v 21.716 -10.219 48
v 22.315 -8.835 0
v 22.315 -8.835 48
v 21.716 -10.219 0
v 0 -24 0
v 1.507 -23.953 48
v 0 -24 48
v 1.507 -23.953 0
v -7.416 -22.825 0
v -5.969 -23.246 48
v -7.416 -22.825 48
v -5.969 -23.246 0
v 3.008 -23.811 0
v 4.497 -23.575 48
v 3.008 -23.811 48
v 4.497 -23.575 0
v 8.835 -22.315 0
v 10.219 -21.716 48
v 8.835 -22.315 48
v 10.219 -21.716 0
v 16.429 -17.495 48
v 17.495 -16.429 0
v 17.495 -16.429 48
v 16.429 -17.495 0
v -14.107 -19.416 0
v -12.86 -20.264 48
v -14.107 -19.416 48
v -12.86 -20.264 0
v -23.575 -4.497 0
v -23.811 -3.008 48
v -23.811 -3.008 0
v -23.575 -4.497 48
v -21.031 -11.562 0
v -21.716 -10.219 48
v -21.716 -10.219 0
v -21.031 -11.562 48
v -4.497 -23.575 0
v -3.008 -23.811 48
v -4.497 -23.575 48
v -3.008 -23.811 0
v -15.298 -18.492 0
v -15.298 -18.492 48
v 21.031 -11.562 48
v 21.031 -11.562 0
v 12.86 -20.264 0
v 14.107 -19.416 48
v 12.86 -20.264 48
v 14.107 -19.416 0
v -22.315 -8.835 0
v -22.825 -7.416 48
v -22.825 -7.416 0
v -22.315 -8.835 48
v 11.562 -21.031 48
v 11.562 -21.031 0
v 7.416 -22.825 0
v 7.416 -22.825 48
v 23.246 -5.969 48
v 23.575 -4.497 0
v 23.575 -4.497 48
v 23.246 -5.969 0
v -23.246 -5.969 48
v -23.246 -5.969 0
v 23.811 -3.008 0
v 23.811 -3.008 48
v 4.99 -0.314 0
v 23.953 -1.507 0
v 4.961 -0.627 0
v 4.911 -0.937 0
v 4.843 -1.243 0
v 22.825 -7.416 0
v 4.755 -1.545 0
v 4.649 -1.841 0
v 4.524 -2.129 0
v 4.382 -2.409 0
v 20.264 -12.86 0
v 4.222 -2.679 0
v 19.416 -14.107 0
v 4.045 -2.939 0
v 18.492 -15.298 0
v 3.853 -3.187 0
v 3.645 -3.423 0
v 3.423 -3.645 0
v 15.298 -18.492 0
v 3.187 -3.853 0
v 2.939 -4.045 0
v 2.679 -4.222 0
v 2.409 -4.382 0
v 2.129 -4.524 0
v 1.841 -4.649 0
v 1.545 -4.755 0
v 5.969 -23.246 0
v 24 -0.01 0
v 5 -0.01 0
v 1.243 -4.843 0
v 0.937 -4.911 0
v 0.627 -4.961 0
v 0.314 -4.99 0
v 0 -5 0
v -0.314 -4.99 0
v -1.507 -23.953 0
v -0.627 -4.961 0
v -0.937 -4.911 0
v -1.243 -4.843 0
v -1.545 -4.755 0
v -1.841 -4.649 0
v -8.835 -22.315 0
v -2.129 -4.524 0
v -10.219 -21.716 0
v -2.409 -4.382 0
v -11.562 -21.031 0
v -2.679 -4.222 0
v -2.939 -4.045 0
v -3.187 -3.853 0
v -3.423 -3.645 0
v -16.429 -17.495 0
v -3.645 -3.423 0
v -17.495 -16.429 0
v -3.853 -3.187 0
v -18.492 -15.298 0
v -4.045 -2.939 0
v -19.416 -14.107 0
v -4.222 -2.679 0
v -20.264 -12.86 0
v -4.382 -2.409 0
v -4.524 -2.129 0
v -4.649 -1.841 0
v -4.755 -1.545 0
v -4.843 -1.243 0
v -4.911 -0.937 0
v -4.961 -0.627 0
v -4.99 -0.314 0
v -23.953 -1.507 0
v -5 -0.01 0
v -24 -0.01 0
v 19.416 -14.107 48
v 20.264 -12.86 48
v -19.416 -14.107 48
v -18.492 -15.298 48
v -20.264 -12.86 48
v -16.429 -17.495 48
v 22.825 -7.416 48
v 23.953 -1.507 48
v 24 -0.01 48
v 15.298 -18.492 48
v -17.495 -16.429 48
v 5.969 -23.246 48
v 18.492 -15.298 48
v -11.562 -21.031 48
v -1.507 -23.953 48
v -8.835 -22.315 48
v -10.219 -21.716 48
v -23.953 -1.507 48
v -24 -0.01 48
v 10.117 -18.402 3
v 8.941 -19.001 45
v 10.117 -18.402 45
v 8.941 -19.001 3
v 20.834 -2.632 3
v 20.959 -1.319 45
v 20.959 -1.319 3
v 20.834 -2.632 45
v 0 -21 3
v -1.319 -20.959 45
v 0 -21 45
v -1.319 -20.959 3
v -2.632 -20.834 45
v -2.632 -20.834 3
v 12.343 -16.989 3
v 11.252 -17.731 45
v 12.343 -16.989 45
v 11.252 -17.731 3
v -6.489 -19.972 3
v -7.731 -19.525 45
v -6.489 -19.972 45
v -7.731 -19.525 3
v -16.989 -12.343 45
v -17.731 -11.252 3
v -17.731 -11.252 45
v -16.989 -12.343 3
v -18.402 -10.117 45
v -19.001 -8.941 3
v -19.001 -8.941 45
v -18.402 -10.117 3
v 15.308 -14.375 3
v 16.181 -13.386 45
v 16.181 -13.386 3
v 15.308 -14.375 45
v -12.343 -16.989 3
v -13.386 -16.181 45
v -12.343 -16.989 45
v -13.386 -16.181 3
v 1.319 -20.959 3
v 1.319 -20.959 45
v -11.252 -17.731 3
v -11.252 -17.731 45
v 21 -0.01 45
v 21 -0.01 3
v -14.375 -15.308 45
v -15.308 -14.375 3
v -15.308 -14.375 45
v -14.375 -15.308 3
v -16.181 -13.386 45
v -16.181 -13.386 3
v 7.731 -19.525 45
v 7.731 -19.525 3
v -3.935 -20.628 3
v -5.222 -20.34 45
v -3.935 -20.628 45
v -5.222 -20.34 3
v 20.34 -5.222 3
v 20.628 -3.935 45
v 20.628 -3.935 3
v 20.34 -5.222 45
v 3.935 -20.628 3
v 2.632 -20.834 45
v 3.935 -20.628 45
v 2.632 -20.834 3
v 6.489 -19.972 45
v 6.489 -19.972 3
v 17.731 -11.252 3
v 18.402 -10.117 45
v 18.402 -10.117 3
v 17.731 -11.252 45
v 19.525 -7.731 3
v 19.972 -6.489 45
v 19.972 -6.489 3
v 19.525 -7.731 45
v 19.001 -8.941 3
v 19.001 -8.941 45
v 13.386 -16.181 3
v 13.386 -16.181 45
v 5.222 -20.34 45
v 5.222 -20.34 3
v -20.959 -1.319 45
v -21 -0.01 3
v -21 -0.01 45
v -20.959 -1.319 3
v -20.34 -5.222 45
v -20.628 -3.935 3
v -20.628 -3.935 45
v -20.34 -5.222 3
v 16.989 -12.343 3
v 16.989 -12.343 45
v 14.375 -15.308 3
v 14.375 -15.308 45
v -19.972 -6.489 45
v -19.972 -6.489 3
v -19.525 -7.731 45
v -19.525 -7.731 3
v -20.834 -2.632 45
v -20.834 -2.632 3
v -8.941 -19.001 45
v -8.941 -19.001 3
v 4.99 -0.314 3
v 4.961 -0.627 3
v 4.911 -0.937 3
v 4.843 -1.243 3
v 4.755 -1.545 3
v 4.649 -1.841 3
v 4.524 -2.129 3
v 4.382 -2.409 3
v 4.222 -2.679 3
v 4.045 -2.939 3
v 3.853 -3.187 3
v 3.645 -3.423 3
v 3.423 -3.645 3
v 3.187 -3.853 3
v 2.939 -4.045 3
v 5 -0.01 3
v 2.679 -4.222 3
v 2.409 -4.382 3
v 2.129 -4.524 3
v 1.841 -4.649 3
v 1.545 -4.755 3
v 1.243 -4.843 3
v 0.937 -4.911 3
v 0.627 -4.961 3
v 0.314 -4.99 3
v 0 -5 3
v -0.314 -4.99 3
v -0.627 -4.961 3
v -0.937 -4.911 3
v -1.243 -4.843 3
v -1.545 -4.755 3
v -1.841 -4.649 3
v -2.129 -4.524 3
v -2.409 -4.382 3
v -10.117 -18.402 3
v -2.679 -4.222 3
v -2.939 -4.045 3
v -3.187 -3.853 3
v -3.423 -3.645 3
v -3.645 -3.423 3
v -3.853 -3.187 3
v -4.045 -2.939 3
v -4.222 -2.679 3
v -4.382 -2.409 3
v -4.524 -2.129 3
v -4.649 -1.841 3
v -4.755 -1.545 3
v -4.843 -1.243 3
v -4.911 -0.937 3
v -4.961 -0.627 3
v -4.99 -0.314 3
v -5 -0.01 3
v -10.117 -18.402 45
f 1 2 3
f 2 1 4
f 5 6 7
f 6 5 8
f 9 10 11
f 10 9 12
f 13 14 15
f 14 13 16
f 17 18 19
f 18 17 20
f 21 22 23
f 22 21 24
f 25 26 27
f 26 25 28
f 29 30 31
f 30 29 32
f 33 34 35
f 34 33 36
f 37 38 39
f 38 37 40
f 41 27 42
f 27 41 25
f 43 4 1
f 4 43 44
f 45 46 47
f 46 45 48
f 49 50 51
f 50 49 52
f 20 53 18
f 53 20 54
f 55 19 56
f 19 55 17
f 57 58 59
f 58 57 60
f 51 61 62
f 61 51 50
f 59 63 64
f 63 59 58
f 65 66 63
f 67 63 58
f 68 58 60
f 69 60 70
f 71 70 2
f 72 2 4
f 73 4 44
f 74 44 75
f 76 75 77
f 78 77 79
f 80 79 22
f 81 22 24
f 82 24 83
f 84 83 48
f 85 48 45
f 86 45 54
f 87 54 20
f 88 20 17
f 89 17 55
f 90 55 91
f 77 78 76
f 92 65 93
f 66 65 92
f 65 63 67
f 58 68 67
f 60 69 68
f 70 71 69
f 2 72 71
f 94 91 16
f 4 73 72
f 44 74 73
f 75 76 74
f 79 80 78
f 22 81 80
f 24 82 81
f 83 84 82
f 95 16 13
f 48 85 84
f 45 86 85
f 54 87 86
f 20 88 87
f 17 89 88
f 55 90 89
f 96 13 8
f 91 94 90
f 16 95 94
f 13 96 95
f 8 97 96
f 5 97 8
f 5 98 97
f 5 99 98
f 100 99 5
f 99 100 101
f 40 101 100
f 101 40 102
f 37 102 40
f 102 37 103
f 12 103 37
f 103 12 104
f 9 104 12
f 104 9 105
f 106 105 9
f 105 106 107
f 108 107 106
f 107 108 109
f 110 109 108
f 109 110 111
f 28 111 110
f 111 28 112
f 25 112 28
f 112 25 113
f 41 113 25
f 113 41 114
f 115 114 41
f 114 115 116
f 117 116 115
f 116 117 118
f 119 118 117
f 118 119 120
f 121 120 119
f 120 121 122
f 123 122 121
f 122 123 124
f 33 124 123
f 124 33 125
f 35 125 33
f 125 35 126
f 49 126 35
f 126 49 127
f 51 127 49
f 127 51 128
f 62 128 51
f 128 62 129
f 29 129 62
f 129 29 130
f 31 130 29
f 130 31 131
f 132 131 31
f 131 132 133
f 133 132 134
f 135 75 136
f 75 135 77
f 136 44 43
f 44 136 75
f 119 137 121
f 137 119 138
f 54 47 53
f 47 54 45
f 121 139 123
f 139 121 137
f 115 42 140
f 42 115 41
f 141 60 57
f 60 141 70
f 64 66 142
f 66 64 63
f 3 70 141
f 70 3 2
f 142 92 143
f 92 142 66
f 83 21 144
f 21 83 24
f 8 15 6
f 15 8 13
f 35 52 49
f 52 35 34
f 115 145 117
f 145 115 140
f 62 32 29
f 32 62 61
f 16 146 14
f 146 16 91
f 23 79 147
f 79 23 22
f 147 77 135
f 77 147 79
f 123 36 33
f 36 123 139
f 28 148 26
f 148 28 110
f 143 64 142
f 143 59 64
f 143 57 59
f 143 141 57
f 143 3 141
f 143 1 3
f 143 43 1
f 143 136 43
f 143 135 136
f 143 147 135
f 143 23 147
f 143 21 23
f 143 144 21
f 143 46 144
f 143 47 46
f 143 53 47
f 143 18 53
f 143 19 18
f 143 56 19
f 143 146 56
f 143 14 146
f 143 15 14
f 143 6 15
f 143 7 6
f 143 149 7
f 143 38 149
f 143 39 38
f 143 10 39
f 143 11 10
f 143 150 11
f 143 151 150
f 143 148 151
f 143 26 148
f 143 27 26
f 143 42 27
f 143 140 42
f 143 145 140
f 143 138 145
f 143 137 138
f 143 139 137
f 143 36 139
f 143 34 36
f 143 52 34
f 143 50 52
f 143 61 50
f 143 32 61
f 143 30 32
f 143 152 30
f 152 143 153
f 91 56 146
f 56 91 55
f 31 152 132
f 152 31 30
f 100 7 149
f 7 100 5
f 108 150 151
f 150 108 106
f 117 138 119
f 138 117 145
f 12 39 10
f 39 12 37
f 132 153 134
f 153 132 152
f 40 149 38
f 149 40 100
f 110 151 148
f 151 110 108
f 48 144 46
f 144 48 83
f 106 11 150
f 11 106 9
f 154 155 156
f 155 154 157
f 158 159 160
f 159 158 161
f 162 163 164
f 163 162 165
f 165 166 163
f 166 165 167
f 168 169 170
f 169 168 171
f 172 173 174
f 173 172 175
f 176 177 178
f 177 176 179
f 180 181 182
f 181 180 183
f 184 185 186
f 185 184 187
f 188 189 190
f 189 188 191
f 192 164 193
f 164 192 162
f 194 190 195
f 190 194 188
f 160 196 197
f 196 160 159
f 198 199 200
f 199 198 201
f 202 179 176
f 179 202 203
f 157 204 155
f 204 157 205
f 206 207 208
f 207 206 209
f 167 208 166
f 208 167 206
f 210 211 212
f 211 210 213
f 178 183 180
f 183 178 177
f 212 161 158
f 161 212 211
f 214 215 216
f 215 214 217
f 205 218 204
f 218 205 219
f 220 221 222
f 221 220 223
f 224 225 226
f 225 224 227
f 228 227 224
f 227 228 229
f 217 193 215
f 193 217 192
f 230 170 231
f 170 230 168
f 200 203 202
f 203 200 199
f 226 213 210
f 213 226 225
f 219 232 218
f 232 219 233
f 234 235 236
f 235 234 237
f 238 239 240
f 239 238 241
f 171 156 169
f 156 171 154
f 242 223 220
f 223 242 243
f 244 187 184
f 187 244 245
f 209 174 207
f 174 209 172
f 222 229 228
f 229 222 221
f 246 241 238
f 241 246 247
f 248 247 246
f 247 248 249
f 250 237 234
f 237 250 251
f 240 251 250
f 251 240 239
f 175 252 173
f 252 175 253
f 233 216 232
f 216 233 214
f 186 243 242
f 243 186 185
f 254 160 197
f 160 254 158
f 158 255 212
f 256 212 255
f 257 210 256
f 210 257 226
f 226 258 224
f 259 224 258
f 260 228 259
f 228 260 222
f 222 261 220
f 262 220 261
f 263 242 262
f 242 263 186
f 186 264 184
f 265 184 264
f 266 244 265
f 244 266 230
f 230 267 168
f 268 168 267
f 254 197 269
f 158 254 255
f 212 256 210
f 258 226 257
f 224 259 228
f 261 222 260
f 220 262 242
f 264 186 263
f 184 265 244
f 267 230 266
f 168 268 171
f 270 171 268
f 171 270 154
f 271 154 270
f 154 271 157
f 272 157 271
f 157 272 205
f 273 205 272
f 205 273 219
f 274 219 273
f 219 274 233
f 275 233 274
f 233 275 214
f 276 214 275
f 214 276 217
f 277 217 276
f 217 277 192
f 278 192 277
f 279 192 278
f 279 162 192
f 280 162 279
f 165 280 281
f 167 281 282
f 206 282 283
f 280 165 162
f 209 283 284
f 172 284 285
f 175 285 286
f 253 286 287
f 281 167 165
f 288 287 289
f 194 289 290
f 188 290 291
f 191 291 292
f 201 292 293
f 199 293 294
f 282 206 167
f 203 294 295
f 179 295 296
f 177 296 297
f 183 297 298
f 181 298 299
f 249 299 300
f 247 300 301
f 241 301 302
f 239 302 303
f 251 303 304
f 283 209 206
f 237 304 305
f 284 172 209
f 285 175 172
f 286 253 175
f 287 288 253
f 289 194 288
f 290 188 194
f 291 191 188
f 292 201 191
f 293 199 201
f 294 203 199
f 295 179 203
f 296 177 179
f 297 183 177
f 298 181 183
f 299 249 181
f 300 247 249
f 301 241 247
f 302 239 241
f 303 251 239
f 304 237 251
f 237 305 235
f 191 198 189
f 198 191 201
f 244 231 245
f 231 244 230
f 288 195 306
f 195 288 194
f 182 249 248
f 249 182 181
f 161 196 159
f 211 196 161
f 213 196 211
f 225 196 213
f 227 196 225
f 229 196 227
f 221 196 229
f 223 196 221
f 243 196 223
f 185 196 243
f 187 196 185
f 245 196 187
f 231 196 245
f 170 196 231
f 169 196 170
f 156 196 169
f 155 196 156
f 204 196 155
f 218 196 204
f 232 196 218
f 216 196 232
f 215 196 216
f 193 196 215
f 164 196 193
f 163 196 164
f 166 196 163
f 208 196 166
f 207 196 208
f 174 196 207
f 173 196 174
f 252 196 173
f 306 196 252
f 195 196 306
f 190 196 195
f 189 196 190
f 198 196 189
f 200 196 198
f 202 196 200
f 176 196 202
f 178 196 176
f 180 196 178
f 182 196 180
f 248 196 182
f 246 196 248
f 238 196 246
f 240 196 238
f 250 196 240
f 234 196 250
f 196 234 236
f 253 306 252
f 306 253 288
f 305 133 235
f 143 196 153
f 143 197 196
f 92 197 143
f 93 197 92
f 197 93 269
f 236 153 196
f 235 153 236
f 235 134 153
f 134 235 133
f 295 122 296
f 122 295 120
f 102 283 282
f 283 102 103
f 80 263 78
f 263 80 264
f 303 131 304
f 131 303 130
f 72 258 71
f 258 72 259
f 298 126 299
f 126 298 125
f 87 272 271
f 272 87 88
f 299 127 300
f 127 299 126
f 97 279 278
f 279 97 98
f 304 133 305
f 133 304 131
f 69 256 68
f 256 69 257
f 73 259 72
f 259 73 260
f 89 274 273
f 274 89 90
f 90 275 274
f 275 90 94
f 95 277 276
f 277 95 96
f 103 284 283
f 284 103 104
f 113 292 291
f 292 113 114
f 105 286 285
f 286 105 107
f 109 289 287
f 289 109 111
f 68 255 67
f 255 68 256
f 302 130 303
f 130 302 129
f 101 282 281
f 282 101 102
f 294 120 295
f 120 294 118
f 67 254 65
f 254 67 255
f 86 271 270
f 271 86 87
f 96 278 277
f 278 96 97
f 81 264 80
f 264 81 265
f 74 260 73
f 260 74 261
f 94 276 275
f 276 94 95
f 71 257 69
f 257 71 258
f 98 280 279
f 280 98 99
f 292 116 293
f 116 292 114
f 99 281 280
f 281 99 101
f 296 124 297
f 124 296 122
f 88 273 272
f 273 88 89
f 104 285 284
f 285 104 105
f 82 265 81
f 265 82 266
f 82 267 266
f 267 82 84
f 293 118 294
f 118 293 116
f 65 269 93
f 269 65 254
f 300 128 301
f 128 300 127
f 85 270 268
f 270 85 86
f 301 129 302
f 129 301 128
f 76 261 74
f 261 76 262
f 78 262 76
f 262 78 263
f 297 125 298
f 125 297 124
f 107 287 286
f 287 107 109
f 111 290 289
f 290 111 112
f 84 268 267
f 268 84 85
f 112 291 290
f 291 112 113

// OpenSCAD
wallThickness=3;
moduleSize=42;
cableGap=5;
$fn=100;

difference() {
	cylinder(r=moduleSize/2 + wallThickness, h=moduleSize+2*wallThickness);
	translate([0,0, wallThickness]) {
		cylinder(r=moduleSize / 2, h=moduleSize);
	}
	translate([-moduleSize / 2 - wallThickness, -0.01, -0.01]) {
		cube([moduleSize + wallThickness * 2, moduleSize + wallThickness * 2, moduleSize + 2 * wallThickness + 0.02]);
	}
	translate([0,0,-0.01]) {
		cylinder(r=cableGap, h=wallThickness + 0.02);
	}
}
